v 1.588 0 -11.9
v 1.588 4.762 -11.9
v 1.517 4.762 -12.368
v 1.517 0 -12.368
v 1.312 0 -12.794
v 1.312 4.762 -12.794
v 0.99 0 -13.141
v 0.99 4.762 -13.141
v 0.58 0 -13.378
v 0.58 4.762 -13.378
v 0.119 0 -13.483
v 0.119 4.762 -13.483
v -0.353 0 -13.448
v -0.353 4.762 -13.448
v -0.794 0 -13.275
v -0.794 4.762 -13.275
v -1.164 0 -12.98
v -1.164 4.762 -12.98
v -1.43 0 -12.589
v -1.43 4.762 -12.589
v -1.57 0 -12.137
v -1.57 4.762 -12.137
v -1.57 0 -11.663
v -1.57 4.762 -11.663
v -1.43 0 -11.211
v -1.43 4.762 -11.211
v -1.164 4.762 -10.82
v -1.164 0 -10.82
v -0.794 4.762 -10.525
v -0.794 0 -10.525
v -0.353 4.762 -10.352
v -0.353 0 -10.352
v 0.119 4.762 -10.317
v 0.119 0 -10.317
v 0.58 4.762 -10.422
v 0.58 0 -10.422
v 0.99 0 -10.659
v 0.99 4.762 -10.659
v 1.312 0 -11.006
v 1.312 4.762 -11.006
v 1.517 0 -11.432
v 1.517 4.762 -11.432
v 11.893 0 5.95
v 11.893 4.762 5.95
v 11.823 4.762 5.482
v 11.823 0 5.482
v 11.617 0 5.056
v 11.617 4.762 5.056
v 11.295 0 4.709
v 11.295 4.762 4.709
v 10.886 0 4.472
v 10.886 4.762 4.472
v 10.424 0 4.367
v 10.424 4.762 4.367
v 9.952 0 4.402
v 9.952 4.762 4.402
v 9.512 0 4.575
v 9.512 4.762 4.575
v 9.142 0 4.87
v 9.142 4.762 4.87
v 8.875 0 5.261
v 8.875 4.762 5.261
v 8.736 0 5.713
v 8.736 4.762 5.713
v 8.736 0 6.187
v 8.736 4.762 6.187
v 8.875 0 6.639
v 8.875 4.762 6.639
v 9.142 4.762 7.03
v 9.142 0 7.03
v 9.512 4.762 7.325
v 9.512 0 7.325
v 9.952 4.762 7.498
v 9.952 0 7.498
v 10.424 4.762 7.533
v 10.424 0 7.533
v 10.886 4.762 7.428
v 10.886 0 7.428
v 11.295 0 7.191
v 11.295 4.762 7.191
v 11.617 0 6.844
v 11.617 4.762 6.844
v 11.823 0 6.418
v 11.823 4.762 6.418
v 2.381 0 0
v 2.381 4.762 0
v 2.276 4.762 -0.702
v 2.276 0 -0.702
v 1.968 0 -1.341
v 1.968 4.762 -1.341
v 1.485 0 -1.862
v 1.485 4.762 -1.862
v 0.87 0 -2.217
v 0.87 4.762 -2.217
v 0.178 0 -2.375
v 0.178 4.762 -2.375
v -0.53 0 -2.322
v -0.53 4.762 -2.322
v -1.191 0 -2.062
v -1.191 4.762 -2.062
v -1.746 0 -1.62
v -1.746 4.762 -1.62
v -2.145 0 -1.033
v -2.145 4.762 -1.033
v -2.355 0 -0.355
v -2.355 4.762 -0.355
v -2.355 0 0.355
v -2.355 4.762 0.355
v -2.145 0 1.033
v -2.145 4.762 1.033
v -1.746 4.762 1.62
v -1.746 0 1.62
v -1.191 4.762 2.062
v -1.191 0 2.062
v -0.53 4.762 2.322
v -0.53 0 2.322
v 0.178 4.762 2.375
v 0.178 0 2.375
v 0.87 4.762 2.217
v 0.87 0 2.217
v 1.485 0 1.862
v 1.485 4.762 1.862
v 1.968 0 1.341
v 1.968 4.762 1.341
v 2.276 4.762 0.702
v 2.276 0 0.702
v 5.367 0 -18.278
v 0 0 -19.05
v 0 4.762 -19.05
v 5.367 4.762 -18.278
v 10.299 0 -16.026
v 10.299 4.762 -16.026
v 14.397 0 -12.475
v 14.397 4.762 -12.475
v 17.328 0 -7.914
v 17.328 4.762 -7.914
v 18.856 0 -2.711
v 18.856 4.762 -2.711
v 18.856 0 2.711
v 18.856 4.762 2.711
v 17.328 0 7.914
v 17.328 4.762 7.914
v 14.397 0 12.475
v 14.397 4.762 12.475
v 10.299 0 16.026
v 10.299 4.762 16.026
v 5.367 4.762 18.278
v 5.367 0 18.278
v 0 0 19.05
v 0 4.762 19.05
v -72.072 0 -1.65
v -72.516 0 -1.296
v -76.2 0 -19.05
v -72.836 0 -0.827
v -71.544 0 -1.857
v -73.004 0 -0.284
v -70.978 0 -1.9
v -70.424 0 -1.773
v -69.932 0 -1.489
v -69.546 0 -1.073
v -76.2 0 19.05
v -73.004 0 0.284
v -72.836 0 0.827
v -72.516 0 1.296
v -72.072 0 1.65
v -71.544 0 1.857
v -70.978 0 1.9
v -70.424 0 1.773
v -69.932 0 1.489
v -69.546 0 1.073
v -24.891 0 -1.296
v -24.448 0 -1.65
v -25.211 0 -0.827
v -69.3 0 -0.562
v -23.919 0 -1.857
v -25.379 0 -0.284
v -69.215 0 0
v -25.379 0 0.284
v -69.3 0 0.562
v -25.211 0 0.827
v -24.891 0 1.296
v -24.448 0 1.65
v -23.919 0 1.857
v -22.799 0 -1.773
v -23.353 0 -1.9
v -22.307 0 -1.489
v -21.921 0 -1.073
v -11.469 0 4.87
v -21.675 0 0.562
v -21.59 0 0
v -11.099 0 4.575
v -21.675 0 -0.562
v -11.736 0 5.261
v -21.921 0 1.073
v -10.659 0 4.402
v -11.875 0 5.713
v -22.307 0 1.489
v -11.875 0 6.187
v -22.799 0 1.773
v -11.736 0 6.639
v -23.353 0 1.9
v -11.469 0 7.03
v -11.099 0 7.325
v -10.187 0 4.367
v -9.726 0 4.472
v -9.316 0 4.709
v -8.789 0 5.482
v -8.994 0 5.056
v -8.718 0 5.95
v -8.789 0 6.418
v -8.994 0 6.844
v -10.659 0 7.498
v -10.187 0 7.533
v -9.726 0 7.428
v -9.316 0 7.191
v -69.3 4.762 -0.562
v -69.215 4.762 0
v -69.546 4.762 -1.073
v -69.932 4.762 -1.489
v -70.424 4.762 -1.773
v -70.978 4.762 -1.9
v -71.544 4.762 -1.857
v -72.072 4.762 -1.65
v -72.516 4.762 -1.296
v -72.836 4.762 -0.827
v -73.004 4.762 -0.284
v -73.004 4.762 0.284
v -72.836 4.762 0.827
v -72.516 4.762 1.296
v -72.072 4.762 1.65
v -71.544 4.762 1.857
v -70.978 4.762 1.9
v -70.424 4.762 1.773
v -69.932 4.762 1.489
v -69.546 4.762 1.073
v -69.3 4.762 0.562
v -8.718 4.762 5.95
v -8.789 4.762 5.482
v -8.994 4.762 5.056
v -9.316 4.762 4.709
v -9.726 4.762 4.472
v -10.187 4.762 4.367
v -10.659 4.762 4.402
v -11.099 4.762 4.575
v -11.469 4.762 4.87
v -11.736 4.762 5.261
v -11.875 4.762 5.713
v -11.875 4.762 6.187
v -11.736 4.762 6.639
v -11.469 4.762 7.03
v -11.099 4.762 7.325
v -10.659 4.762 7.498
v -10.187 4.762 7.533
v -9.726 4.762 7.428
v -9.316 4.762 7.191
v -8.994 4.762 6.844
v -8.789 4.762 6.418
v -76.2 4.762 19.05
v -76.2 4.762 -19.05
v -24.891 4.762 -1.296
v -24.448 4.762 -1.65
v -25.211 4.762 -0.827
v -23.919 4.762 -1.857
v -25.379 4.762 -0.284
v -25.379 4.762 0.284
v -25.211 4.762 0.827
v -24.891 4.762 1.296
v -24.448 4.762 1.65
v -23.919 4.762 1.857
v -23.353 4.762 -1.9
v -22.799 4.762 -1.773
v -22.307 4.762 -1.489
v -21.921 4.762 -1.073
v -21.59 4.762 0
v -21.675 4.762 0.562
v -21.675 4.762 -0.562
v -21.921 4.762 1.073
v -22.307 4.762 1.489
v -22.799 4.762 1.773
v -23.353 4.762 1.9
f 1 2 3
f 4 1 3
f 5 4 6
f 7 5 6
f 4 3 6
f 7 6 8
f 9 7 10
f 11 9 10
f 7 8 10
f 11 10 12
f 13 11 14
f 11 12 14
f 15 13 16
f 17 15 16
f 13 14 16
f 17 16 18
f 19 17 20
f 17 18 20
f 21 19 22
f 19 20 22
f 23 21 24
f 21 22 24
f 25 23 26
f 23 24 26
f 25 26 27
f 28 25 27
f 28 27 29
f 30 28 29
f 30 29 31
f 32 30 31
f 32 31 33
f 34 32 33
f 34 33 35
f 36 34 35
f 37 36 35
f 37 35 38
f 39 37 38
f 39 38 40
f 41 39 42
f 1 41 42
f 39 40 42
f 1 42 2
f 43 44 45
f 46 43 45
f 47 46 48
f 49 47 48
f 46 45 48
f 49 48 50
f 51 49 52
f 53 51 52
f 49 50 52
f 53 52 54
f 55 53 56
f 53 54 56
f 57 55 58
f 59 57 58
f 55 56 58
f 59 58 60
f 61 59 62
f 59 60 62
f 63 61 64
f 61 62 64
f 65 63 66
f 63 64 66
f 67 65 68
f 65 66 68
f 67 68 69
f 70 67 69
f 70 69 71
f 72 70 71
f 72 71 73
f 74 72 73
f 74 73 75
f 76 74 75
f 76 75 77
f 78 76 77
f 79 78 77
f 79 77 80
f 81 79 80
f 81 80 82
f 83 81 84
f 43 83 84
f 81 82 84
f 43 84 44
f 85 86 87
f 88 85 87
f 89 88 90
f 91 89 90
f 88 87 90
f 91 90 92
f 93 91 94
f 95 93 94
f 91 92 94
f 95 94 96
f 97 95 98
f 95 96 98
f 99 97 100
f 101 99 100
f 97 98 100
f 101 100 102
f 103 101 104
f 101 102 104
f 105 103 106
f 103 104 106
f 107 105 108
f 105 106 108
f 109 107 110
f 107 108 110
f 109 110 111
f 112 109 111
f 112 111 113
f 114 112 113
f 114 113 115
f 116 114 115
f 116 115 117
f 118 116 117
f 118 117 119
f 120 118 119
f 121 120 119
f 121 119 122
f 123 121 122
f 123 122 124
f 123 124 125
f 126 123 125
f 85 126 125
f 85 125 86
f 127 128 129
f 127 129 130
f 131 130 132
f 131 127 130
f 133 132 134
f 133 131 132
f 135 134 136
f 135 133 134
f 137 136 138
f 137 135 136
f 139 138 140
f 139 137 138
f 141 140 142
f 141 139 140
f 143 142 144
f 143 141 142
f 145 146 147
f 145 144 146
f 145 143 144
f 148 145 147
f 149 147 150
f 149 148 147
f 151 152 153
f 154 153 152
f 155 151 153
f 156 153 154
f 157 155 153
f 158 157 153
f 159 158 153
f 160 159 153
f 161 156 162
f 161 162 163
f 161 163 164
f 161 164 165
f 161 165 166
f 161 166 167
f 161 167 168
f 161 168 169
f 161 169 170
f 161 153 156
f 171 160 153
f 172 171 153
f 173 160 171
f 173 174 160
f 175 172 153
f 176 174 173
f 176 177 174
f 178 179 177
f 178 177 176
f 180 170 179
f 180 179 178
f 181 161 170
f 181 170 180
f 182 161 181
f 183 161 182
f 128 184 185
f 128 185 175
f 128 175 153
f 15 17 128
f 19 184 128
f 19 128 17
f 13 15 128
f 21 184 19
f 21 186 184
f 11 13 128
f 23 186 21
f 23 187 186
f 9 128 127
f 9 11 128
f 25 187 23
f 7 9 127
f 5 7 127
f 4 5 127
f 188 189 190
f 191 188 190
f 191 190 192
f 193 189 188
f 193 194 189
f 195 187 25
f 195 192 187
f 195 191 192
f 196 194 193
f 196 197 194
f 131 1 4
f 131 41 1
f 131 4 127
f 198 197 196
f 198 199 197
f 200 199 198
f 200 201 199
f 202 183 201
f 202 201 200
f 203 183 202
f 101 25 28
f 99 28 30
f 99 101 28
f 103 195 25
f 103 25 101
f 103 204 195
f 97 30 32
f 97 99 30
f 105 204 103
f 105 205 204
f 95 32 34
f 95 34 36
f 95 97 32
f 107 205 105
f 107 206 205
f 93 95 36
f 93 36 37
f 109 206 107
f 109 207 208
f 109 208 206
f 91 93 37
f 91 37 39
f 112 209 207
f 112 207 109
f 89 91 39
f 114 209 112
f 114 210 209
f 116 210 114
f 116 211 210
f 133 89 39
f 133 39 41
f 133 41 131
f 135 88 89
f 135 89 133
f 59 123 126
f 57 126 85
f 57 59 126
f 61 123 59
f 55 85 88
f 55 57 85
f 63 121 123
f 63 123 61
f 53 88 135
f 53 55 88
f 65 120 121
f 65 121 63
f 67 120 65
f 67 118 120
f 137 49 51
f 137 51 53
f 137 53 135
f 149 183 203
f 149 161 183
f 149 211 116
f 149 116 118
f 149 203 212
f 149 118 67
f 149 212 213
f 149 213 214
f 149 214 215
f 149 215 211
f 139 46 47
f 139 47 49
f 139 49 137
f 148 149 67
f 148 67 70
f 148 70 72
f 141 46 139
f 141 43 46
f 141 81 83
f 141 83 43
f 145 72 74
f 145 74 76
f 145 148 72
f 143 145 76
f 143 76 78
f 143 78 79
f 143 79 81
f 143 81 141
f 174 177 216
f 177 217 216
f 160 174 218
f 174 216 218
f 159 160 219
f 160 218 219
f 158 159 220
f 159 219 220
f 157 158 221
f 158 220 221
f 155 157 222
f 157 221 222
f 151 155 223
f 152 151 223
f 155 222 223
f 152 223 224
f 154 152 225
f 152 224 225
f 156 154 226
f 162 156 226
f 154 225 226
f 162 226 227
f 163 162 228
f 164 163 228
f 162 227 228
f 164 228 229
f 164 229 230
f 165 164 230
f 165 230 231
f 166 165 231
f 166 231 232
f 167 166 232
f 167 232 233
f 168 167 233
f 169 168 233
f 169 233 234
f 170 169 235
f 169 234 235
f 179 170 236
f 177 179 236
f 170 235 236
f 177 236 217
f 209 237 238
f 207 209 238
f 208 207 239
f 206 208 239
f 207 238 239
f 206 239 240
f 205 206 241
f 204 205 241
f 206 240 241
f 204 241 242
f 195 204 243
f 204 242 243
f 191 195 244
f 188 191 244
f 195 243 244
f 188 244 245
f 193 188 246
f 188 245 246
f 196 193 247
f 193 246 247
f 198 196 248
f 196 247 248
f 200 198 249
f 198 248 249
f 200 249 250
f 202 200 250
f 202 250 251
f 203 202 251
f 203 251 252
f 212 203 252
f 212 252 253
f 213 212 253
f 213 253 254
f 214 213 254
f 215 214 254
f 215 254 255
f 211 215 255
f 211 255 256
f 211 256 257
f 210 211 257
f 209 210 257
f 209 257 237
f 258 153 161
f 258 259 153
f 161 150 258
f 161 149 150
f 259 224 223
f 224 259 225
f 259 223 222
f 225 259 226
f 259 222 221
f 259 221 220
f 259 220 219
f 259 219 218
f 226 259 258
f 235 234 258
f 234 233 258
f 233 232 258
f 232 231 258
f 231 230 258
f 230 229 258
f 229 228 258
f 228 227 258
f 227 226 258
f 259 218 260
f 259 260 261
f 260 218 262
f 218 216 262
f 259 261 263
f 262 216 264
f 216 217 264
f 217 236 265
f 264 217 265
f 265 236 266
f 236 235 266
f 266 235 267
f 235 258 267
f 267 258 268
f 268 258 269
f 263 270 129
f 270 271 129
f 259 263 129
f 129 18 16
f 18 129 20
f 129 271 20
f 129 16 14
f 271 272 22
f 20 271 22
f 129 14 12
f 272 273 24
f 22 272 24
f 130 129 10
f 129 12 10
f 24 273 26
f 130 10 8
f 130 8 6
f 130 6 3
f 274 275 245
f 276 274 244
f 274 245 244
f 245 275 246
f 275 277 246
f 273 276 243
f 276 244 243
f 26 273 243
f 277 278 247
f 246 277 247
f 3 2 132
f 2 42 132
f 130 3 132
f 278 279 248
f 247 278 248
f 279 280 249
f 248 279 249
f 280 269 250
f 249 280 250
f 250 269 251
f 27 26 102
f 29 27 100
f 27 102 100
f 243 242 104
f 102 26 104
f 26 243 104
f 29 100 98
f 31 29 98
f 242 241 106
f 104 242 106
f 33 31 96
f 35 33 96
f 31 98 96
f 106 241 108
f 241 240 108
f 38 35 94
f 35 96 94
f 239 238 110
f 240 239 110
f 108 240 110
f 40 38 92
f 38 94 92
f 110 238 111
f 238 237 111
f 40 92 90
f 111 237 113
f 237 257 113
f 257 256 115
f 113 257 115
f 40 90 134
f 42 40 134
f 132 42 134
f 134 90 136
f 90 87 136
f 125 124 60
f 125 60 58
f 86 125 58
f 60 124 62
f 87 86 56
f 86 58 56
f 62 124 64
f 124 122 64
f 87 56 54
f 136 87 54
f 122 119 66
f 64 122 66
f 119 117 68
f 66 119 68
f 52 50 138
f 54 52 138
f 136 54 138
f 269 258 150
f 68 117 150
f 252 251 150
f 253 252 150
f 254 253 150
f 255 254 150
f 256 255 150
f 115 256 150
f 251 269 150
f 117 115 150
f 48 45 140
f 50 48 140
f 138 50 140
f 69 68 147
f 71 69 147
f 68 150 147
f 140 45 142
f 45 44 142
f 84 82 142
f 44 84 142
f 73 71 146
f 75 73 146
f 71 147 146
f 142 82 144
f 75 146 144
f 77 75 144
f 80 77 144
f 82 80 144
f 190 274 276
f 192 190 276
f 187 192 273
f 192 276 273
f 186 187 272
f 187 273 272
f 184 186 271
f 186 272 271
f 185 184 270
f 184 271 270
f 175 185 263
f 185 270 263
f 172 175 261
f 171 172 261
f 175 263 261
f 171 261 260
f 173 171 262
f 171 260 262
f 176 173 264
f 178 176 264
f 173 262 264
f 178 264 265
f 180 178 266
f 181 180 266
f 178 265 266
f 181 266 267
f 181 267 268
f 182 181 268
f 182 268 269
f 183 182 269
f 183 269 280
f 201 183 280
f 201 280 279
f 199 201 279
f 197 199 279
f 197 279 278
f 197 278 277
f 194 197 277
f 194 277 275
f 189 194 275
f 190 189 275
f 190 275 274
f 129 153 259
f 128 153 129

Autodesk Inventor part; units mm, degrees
ref_plane "YZ Plane" through (0, 0, 0) normal (1, 0, 0) x (0, 1, 0)
ref_plane "XZ Plane" through (0, 0, 0) normal (0, 1, 0) x (-1, 0, 0)
ref_plane "XY Plane" through (0, 0, 0) normal (0, 0, 1) x (1, 0, 0)
sketch "Sketch1" plane through (0, 0, 0) normal (0, 1, 0) x (-1, 0, 0)
  circle A0 centre (0, 0) radius 19.05
  dimension "d0" = 38.1
extrude "Extrusion1" add sketch "Sketch1" along normal blind 4.7625
sketch "Sketch2" plane through (0, 4.7625, 0) normal (0, 1, 0) x (1, 0, 0)
  circle A0 centre (0, 0) radius 2.3813
  circle A1 centre (0, 0) radius 19.05 projected
  circle A2 centre (-10.3056, -5.95) radius 1.5875
  circle A3 centre (0, 11.8999) radius 1.5875
  circle A4 centre (10.3056, -5.95) radius 1.5875
  dimension "d3" = 4.7625
  dimension "d4" = 3.175
  dimension "d5" = 3.175
  dimension "d6" = 3.175
extrude "Extrusion2" cut sketch "Sketch2" against normal blind 4.7625 contours A0 | A2 | A3 | A4
sketch "Sketch3" plane through (0, 0, 0) normal (0, -1, 0) x (1, 0, 0)
  circle A0 centre (0, 0) radius 19.05 projected
  line L0 (0, -19.05) -> (0, 19.05)
  line L1 (0, 19.05) -> (-127, 19.05)
  line L2 (-127, 19.05) -> (-127, -19.05)
  line L3 (-127, -19.05) -> (0, -19.05)
  dimension "d9" = 127
extrude "Extrusion3" add sketch "Sketch3" against normal blind 4.7625 contours A0 L3 L2 L1
sketch "Sketch4" plane through (0, 4.7625, 0) normal (0, 1, 0) x (1, 0, 0)
  line L0 (-127, 19.05) -> (-127, -19.05) projected
  line L1 (-127, 19.05) -> (-76.2, 19.05)
  line L2 (-76.2, 19.05) -> (-76.2, -19.05)
  line L3 (-76.2, -19.05) -> (-127, -19.05)
  line L4 (-127, -19.05) -> (-127, 19.05)
  point P0 (0, 0)
  dimension "d12" = 50.8
extrude "Extrusion4" cut sketch "Sketch4" against normal blind 25.4
sketch "Sketch5" plane through (0, 4.7625, 0) normal (0, 1, 0) x (1, 0, 0)
  line L0 (-76.2, 19.05) -> (-76.2, -19.05) projected
  line L1 (-76.2, 0) -> (-71.12, 0)
  circle A0 centre (-71.12, 0) radius 1.905
  line L2 (-71.12, 0) -> (-23.495, 0)
  circle A1 centre (-23.495, 0) radius 1.905
  point P0 (0, 0)
  dimension "d15" = 5.08
  dimension "d16" = 3.81
  dimension "d17" = 47.625
  dimension "d18" = 3.81
extrude "Extrusion5" cut sketch "Sketch5" against normal blind 25.4
properties part number "Robotics_PenMount"
